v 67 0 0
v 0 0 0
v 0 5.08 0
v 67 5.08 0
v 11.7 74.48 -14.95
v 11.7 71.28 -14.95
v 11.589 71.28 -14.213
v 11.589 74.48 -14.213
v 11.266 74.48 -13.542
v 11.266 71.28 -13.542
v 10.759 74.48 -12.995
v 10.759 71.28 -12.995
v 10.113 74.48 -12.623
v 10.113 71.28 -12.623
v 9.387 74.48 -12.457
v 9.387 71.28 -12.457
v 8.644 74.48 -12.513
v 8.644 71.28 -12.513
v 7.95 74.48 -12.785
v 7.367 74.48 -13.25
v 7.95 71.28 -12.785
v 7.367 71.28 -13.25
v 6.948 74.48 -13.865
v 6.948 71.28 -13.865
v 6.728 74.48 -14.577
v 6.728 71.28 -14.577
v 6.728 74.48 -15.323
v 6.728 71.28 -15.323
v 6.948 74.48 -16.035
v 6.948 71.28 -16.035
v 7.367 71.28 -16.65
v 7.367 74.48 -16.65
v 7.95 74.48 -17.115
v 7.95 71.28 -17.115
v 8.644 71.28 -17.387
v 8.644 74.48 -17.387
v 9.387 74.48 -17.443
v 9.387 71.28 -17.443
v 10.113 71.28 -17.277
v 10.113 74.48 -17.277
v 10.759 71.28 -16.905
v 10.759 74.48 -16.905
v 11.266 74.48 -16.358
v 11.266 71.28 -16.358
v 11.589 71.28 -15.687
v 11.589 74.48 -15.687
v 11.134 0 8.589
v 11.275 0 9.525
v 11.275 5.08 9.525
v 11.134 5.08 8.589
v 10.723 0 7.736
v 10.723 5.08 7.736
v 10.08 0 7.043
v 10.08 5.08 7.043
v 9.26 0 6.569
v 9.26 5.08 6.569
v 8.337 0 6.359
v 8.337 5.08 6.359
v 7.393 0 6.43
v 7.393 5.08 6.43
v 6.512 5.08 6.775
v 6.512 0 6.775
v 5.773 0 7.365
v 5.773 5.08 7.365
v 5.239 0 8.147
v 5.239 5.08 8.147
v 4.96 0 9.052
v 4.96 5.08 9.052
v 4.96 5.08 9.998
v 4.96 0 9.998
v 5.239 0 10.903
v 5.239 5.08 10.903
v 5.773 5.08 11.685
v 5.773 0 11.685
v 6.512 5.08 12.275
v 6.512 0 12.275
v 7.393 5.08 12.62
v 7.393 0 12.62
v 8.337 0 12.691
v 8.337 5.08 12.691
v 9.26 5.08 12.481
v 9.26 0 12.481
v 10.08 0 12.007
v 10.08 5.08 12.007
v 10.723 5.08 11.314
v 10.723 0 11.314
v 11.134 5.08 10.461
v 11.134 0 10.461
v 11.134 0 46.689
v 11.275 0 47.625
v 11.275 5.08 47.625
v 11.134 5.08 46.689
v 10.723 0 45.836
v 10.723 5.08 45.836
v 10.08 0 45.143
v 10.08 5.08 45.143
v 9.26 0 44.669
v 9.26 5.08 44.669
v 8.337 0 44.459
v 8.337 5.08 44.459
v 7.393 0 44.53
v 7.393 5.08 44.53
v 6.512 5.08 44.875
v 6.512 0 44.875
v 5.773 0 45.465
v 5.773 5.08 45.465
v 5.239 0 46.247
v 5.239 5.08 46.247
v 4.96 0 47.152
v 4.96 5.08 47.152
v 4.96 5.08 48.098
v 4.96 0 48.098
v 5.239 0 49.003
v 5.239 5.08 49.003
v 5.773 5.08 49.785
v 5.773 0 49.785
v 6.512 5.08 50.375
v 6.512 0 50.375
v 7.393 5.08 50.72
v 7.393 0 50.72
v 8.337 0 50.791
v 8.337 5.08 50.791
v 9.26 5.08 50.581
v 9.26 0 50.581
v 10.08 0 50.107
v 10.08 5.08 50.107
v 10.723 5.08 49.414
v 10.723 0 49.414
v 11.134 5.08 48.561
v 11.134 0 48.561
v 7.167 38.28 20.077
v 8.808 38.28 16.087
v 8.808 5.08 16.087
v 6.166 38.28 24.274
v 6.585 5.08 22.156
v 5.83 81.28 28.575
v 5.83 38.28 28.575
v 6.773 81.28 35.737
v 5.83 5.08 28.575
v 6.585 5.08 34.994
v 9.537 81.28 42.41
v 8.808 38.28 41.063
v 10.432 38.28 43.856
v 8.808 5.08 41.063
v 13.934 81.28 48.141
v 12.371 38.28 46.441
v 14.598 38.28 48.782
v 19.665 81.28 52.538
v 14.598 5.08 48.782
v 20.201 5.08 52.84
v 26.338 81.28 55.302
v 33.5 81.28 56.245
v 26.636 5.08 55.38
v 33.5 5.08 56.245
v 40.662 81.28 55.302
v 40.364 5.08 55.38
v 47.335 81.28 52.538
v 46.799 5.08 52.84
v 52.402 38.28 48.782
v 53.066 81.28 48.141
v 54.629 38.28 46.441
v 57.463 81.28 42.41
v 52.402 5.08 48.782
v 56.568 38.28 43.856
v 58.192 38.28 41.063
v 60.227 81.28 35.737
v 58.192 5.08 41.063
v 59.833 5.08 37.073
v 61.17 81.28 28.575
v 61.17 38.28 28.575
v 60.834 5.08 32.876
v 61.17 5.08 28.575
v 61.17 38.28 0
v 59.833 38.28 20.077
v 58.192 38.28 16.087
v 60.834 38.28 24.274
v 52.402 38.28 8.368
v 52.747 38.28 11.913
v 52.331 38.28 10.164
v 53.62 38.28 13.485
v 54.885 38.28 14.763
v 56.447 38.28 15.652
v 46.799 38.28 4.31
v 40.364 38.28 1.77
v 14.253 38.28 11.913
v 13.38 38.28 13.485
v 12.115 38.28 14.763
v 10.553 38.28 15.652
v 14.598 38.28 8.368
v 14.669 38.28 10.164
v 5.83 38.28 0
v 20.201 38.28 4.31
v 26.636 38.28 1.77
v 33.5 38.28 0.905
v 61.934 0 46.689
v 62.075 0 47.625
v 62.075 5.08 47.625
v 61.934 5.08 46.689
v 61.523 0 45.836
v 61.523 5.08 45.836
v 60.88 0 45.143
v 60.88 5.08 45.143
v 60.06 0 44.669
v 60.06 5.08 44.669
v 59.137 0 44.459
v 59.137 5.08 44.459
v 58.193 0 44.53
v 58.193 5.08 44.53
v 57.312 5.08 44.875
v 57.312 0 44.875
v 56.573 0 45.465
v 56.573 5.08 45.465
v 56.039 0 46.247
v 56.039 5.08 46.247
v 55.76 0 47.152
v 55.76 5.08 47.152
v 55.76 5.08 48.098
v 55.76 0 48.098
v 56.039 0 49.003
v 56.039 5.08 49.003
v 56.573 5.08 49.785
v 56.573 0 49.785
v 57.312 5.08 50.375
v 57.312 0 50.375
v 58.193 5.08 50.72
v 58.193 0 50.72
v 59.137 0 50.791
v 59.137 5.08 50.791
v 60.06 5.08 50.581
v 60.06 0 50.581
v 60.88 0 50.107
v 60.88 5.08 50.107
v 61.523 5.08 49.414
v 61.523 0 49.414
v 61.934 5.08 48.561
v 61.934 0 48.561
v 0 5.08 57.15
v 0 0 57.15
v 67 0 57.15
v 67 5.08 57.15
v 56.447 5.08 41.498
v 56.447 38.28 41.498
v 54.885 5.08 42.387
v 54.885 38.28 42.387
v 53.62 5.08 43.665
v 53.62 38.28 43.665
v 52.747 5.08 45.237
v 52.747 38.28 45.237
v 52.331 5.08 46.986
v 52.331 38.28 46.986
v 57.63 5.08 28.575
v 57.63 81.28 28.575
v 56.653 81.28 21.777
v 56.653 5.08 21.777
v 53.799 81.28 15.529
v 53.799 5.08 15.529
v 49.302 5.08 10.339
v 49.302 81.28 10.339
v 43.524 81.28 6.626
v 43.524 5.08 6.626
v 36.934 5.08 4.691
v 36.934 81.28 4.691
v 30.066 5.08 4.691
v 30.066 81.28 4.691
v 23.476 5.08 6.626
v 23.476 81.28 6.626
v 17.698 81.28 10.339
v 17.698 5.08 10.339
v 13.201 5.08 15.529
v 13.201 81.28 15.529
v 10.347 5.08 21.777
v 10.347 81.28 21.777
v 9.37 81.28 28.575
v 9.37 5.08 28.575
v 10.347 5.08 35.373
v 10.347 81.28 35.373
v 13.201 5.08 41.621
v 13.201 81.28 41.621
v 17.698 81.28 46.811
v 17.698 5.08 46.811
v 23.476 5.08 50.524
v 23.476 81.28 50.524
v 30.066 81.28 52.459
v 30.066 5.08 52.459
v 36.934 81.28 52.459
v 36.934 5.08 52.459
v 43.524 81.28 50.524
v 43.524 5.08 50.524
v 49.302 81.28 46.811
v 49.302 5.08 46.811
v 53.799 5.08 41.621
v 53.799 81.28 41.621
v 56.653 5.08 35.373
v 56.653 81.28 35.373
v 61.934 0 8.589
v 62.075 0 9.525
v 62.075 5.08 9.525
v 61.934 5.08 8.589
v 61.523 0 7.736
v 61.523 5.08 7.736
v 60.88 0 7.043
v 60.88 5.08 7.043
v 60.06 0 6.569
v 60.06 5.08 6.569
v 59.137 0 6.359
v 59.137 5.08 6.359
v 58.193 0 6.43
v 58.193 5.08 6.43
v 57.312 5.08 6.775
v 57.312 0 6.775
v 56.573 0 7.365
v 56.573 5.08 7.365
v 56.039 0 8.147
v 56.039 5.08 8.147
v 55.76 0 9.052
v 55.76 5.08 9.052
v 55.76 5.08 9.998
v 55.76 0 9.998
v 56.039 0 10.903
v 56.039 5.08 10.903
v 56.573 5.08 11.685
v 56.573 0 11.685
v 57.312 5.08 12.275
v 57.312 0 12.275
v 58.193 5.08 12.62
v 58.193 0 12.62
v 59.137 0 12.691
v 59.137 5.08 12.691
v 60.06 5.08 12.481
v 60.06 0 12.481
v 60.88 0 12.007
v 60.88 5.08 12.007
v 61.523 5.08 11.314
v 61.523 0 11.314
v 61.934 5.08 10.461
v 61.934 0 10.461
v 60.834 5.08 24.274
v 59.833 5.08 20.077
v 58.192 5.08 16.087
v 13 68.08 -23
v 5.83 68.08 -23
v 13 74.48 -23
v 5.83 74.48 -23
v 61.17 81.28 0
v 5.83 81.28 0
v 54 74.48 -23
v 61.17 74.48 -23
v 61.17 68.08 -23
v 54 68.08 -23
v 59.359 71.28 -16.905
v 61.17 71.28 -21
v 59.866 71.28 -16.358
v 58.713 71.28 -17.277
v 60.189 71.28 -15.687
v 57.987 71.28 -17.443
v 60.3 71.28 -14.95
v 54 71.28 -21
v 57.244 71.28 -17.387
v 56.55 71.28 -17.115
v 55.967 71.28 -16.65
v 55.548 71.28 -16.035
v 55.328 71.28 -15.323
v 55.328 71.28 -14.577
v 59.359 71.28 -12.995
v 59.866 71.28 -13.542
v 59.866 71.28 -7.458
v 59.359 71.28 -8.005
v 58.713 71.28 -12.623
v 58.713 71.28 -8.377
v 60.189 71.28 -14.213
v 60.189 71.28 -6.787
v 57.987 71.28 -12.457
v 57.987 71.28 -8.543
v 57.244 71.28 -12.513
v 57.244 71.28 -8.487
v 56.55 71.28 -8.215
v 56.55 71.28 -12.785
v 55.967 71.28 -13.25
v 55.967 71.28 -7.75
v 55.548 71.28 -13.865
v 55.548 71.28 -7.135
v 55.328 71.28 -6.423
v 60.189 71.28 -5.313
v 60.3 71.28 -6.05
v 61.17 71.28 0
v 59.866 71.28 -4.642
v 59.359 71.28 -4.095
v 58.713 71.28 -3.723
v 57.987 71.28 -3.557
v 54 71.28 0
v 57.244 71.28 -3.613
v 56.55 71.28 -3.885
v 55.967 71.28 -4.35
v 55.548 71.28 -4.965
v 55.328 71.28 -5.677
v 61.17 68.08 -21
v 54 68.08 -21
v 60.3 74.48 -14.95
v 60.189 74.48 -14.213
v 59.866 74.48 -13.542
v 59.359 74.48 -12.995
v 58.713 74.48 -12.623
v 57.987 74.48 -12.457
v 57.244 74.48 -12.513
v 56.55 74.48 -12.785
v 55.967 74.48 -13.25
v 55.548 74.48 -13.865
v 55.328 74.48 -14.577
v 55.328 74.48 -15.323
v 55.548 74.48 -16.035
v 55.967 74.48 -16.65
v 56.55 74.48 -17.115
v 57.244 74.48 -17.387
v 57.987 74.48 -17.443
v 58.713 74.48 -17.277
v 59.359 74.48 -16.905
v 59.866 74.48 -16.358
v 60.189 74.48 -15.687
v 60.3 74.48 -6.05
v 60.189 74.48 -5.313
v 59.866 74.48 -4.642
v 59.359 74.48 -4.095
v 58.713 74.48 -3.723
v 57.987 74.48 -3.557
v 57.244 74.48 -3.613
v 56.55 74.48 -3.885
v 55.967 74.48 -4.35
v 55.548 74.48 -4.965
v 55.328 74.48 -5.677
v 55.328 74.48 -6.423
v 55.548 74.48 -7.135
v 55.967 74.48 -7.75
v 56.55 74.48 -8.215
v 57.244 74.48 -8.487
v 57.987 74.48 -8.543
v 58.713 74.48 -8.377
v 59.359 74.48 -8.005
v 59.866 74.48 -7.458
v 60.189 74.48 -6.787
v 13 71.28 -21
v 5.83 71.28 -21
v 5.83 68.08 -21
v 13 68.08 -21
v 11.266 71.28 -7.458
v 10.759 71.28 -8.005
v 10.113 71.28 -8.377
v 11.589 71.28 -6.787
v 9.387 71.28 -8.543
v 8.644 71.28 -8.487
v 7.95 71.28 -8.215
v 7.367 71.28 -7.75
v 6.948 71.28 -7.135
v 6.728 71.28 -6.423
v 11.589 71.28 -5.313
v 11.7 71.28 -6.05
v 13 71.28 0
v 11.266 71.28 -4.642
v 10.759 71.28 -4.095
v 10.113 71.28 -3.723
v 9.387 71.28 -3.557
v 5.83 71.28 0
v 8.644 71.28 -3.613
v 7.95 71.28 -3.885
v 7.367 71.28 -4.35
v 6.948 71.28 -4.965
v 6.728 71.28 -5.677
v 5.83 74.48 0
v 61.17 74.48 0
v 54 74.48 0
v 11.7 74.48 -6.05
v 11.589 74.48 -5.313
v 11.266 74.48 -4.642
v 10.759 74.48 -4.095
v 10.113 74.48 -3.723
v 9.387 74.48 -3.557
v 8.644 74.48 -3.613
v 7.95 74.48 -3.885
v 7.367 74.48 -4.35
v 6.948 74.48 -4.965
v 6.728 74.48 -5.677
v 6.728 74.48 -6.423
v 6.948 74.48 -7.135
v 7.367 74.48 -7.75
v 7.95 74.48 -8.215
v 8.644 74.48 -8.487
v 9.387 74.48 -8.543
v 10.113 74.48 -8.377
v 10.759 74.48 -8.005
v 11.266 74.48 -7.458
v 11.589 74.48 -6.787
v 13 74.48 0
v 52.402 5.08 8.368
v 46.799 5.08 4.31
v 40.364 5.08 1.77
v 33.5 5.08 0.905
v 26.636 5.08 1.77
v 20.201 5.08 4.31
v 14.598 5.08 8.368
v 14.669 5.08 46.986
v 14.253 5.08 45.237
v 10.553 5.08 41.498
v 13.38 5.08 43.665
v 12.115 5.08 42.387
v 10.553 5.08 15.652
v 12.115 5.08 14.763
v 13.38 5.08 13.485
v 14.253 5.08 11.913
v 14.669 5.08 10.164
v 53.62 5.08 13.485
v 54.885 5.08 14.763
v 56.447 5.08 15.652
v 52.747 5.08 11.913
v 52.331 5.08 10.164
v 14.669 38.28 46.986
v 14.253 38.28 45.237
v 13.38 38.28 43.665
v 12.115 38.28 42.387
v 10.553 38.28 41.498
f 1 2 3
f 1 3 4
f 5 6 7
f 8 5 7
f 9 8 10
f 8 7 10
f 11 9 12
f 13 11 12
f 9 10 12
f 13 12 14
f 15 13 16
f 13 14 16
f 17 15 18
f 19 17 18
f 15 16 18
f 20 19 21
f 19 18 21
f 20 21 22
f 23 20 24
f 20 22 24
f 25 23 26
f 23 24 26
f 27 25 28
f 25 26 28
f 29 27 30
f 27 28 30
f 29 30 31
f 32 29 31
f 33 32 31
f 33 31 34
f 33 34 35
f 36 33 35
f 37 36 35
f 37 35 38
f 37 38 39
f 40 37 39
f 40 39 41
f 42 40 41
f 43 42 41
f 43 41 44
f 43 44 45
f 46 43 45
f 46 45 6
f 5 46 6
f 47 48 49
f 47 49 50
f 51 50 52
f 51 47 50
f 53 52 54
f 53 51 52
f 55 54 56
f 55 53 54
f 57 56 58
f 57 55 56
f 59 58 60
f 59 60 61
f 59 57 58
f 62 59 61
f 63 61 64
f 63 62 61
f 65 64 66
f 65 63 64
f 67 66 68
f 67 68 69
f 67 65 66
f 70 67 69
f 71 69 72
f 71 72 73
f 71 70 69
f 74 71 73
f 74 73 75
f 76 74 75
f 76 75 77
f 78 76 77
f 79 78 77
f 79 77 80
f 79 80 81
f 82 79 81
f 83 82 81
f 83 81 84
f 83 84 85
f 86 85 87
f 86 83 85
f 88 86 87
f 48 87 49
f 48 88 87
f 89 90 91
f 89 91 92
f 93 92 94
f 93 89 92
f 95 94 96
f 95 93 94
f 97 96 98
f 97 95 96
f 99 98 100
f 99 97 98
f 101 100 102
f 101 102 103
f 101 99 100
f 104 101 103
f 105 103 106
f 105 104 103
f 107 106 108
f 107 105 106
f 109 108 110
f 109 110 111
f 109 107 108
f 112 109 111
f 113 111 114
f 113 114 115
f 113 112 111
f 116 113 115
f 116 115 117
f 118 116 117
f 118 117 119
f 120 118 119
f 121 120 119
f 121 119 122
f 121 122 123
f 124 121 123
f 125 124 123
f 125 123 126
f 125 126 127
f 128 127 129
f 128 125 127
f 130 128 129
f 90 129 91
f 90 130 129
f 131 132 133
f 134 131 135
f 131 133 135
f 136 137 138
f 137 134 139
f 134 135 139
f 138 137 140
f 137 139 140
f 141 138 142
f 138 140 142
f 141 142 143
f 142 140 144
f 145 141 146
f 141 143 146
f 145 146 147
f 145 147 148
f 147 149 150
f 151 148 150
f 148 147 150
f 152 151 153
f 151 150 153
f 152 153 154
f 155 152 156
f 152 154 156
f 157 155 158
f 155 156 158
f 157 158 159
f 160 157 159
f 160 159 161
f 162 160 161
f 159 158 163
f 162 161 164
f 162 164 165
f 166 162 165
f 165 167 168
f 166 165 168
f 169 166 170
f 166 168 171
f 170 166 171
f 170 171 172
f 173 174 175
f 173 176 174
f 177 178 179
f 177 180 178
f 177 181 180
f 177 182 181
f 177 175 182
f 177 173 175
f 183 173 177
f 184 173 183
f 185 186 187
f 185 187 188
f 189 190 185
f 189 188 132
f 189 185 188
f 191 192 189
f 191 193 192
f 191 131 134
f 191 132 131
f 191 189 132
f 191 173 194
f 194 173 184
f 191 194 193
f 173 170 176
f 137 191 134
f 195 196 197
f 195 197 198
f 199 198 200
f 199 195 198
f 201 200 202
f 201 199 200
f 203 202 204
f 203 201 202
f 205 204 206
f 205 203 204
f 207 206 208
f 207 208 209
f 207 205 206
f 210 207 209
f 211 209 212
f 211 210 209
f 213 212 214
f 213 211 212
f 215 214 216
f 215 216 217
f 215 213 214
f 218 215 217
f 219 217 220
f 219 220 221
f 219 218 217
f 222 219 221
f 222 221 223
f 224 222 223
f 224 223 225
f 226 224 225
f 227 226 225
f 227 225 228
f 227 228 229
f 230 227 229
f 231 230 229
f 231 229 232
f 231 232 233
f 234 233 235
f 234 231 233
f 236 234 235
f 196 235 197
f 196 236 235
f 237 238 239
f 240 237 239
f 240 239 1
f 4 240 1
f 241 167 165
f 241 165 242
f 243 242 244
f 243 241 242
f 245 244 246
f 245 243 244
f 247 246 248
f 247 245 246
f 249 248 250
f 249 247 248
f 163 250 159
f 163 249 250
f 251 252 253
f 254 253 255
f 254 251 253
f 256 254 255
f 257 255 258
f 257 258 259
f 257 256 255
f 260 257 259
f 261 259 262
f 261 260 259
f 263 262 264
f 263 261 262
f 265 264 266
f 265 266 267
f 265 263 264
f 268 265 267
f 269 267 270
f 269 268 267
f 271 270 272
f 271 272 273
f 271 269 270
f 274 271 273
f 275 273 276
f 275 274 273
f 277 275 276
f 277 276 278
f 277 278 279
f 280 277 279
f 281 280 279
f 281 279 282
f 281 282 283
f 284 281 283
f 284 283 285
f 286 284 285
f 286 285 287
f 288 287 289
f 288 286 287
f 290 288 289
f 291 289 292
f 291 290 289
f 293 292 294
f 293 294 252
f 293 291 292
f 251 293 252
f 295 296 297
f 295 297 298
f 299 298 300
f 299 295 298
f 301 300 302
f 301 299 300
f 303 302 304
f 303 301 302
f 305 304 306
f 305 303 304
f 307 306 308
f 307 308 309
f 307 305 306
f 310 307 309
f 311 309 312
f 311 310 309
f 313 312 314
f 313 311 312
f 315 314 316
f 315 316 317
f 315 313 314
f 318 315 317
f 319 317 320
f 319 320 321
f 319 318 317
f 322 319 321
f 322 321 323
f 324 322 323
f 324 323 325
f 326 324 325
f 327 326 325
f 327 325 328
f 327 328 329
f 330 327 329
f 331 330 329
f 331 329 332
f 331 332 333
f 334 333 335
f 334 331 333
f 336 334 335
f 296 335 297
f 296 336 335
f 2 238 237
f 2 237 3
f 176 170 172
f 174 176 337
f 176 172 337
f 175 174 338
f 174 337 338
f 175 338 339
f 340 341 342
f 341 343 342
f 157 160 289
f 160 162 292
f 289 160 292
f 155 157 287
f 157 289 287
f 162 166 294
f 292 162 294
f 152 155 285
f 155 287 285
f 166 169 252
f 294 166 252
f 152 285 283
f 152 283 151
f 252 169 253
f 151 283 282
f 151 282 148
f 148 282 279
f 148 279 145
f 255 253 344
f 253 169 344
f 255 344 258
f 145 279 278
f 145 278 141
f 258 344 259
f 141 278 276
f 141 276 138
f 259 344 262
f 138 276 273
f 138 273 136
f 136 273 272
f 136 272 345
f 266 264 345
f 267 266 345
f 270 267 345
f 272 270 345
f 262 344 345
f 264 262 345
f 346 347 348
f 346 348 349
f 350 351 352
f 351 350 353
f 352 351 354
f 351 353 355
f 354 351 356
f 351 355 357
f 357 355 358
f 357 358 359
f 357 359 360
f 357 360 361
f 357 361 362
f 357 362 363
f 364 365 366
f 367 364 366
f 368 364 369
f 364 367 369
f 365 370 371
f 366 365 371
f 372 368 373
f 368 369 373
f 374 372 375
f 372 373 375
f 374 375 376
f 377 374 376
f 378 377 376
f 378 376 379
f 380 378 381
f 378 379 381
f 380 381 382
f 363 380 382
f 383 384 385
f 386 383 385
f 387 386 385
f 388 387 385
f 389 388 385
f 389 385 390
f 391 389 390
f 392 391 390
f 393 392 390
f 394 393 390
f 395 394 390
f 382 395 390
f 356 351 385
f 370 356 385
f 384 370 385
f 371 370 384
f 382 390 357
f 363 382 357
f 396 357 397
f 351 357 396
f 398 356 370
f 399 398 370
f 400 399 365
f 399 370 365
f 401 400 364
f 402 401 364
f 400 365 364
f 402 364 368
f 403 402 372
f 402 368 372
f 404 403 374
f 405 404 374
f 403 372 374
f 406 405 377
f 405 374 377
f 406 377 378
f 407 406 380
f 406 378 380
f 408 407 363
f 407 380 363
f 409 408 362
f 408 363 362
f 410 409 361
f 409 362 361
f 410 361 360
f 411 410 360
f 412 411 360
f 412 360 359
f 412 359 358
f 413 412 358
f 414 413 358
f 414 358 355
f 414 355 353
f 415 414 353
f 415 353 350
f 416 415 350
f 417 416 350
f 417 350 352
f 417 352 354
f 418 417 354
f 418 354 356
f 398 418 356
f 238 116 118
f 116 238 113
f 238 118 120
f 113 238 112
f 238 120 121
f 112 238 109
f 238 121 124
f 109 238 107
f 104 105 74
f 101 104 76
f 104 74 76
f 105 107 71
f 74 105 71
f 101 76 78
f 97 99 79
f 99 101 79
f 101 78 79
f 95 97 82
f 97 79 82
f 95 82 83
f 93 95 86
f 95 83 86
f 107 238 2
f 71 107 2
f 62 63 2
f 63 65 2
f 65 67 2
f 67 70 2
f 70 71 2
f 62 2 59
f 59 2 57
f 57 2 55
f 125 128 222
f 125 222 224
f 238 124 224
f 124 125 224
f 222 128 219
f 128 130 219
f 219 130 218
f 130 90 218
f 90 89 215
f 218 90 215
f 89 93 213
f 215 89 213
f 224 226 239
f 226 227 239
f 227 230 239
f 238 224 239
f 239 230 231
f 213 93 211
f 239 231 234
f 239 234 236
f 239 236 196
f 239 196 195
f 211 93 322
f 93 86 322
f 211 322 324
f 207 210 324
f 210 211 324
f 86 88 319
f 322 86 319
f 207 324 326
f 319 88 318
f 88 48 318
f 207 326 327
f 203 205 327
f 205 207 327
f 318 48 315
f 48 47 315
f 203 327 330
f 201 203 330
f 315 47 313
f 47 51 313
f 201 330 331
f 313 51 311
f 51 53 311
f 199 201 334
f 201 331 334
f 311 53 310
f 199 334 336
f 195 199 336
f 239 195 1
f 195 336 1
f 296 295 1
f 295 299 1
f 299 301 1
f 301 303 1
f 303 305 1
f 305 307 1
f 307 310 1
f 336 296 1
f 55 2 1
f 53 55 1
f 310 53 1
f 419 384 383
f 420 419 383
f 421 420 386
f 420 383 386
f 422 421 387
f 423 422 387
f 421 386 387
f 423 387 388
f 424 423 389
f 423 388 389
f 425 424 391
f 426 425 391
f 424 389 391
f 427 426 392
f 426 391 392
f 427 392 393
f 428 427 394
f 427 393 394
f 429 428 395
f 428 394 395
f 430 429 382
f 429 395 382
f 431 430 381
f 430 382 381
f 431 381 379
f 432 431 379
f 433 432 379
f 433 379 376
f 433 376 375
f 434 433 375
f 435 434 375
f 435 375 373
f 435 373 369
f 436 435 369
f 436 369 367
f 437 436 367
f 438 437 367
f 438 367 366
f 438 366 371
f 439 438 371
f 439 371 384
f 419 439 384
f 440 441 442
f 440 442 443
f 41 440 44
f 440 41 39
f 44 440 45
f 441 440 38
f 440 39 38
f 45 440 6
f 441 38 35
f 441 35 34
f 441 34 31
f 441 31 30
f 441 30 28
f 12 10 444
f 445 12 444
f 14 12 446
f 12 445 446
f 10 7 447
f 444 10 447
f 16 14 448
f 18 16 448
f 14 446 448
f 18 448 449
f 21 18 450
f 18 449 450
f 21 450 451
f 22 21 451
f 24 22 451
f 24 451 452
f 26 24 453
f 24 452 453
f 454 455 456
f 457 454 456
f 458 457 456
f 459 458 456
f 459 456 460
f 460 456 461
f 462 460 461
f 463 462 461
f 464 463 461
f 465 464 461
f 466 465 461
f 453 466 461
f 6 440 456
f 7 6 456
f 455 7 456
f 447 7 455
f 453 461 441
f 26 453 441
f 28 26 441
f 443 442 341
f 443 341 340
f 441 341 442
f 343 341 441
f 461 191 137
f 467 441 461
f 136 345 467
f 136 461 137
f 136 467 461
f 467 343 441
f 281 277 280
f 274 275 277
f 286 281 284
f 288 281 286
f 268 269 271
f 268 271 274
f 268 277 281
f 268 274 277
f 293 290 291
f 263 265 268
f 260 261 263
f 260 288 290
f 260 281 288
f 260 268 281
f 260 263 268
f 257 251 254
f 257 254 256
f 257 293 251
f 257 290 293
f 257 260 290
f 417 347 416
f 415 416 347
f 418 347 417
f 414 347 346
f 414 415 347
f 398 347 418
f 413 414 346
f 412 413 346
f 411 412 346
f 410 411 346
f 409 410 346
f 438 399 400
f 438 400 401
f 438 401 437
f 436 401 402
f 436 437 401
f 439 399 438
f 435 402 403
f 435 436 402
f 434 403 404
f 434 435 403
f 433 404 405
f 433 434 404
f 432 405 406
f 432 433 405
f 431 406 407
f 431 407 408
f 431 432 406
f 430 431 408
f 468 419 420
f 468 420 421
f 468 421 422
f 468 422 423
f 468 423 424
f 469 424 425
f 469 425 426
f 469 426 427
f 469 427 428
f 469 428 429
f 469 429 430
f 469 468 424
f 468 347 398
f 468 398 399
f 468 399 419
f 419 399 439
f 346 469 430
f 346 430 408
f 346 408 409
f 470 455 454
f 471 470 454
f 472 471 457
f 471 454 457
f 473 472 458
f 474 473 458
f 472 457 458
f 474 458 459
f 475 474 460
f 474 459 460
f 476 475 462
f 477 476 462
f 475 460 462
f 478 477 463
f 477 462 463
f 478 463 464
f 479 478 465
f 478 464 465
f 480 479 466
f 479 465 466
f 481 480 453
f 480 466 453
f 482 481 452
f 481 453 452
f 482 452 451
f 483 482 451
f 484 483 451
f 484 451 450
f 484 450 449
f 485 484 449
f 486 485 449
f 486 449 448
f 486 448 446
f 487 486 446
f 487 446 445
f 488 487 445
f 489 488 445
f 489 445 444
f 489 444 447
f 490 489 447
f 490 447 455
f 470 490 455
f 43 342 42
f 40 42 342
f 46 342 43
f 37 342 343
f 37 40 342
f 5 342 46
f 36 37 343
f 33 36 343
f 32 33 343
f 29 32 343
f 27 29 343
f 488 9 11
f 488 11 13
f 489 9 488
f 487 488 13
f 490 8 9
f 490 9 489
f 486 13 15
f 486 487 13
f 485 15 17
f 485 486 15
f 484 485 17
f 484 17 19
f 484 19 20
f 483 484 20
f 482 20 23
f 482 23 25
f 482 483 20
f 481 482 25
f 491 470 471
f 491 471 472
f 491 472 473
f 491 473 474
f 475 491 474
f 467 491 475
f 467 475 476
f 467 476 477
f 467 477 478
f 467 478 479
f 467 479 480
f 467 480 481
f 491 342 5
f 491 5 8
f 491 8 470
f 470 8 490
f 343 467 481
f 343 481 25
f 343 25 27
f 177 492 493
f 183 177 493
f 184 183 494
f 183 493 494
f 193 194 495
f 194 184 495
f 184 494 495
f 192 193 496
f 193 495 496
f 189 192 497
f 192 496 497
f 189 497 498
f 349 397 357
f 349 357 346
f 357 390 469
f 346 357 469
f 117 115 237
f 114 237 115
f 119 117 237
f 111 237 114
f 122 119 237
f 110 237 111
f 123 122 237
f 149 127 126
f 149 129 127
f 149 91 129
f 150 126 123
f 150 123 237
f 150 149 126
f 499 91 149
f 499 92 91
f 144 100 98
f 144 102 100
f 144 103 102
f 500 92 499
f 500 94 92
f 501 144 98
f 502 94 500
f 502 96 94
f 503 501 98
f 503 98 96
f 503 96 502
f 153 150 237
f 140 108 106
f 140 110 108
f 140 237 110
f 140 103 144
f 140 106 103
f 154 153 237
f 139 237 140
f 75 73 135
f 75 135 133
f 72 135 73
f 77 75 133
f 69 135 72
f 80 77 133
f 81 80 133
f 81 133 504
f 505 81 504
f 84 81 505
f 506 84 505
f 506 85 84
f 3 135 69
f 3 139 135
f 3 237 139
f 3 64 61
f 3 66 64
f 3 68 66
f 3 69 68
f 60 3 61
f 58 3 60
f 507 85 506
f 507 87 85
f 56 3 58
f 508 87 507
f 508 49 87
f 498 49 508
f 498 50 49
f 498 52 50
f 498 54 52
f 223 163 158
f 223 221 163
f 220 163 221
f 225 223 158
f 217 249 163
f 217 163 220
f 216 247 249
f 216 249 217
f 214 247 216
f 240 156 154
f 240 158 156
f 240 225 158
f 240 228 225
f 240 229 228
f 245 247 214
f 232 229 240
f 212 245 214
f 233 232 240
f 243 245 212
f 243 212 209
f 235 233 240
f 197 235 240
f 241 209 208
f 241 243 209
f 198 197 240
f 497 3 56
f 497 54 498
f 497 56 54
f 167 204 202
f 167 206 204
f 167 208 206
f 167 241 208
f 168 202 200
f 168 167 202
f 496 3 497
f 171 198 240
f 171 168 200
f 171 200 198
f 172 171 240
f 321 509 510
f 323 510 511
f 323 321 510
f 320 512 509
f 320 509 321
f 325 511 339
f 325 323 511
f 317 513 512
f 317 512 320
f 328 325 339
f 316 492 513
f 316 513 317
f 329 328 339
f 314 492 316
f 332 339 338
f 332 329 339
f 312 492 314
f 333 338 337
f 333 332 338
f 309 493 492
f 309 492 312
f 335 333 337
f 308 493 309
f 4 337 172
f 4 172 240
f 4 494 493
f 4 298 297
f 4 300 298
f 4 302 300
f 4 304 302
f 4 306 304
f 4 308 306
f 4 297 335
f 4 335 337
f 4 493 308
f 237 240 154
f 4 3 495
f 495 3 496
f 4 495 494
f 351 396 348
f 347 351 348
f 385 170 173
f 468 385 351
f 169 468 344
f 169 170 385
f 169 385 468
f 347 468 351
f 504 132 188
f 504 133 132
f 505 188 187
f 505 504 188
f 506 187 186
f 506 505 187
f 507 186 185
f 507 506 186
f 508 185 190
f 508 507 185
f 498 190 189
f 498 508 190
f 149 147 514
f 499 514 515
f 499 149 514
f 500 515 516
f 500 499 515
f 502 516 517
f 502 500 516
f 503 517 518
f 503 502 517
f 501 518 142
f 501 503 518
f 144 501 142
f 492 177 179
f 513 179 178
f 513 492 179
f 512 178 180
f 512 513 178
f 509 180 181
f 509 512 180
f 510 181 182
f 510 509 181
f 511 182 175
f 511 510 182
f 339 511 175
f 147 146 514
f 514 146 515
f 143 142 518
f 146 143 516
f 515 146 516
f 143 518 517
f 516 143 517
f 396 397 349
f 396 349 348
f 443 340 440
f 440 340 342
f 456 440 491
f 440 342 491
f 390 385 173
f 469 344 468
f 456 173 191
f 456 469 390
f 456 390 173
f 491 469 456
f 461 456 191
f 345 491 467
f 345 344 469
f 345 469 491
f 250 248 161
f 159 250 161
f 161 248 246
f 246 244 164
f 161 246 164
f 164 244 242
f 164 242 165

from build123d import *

# Parameters (mm, degrees)
SKETCH1_W           = 67
SKETCH1_H           = 57.15
SKETCH1_R           = 3.175
BOSS_EXTRUDE1_DEPTH = 5.08
SKETCH2_R           = 27.67
SKETCH2_R_2         = 24.13
BOSS_EXTRUDE2_DEPTH = 76.2
BOSS_EXTRUDE3_REACH = 59.15
SKETCH4_W           = 55.34
SKETCH4_H           = 43
SKETCH5_W           = 7.17
SKETCH5_H           = 3.2
BOSS_EXTRUDE4_DEPTH = 21
SKETCH6_R           = 2.5
CUT_EXTRUDE1_DEPTH  = 11
SKETCH7_W           = 7.17
SKETCH7_H           = 3.2
BOSS_EXTRUDE5_DEPTH = 2
SKETCH8_W           = 7.17
SKETCH8_H           = 2
BOSS_EXTRUDE6_DEPTH = 3.2
SKETCH9_R           = 6.6
CUT_EXTRUDE2_DEPTH  = 33.2


with BuildPart() as part:
    # Sketch1 → Boss-Extrude1 (new body)
    with BuildSketch(Plane(origin=(0, 0, 0), x_dir=(1, 0, 0), z_dir=(0, 1, 0))):
        with Locations((33.5, -28.575)):
            Rectangle(SKETCH1_W, SKETCH1_H)
        with Locations((8.1, -9.525)):
            Circle(SKETCH1_R, mode=Mode.SUBTRACT)
        with Locations((58.9, -9.525)):
            Circle(SKETCH1_R, mode=Mode.SUBTRACT)
        with Locations((58.9, -47.625)):
            Circle(SKETCH1_R, mode=Mode.SUBTRACT)
        with Locations((8.1, -47.625)):
            Circle(SKETCH1_R, mode=Mode.SUBTRACT)
    extrude(amount=BOSS_EXTRUDE1_DEPTH)

    # Sketch2 → Boss-Extrude2 (add)
    with BuildSketch(Plane(origin=(0, 5.08, 0), x_dir=(1, 0, 0), z_dir=(0, 1, 0))):
        with Locations((33.5, -28.575)):
            Circle(SKETCH2_R)
        with Locations((33.5, -28.575)):
            Circle(SKETCH2_R_2, mode=Mode.SUBTRACT)
    extrude(amount=BOSS_EXTRUDE2_DEPTH)

    # Sketch4 → Boss-Extrude3 (add, up to next)
    with BuildSketch(Plane(origin=(0, 0, 0), x_dir=(-1, 0, 0), z_dir=(0, 0, -1)), mode=Mode.PRIVATE) as boss_extrude3_sk1:
        with Locations((-33.5, 59.78)):
            Rectangle(SKETCH4_W, SKETCH4_H)
    boss_extrude3_tool1 = extrude(boss_extrude3_sk1.sketch, amount=-BOSS_EXTRUDE3_REACH, mode=Mode.PRIVATE) - part.part
    add(boss_extrude3_tool1.solids().sort_by_distance((33.5, 59.78, 0))[0])

    # Sketch5 → Boss-Extrude4 (add)
    with BuildSketch(Plane(origin=(0, 0, 0), x_dir=(-1, 0, 0), z_dir=(0, 0, -1))):
        with Locations((-9.415, 72.88)):
            Rectangle(SKETCH5_W, SKETCH5_H)
        with Locations((-57.585, 72.88)):
            Rectangle(SKETCH5_W, SKETCH5_H)
    extrude(amount=BOSS_EXTRUDE4_DEPTH)

    # Sketch6 → Cut-Extrude1 (cut, through all)
    with BuildSketch(Plane.XZ.offset(-71.28)):
        with Locations((9.2, -6.05)):
            Circle(SKETCH6_R)
        with Locations((57.8, -6.05)):
            Circle(SKETCH6_R)
        with Locations((57.8, -14.95)):
            Circle(SKETCH6_R)
        with Locations((9.2, -14.95)):
            Circle(SKETCH6_R)
    extrude(amount=-CUT_EXTRUDE1_DEPTH, mode=Mode.SUBTRACT)

    # Sketch7 → Boss-Extrude5 (add)
    with BuildSketch(Plane(origin=(0, 0, -21), x_dir=(-1, 0, 0), z_dir=(0, 0, -1))):
        with Locations((-57.585, 72.88)):
            Rectangle(SKETCH7_W, SKETCH7_H)
        with Locations((-9.415, 72.88)):
            Rectangle(SKETCH7_W, SKETCH7_H)
    extrude(amount=BOSS_EXTRUDE5_DEPTH)

    # Sketch8 → Boss-Extrude6 (add)
    with BuildSketch(Plane.XZ.offset(-71.28)):
        with Locations((9.415, -22)):
            Rectangle(SKETCH8_W, SKETCH8_H)
        with Locations((57.585, -22)):
            Rectangle(SKETCH8_W, SKETCH8_H)
    extrude(amount=BOSS_EXTRUDE6_DEPTH)

    # Sketch9 → Cut-Extrude2 (cut)
    with BuildSketch(Plane(origin=(0, 5.08, 0), x_dir=(1, 0, 0), z_dir=(0, 1, 0))):
        with Locations((8.1, -9.525)):
            Circle(SKETCH9_R)
        with Locations((58.9, -9.525)):
            Circle(SKETCH9_R)
        with Locations((58.9, -47.625)):
            Circle(SKETCH9_R)
        with Locations((8.1, -47.625)):
            Circle(SKETCH9_R)
    extrude(amount=CUT_EXTRUDE2_DEPTH, mode=Mode.SUBTRACT)


solid = part.part
